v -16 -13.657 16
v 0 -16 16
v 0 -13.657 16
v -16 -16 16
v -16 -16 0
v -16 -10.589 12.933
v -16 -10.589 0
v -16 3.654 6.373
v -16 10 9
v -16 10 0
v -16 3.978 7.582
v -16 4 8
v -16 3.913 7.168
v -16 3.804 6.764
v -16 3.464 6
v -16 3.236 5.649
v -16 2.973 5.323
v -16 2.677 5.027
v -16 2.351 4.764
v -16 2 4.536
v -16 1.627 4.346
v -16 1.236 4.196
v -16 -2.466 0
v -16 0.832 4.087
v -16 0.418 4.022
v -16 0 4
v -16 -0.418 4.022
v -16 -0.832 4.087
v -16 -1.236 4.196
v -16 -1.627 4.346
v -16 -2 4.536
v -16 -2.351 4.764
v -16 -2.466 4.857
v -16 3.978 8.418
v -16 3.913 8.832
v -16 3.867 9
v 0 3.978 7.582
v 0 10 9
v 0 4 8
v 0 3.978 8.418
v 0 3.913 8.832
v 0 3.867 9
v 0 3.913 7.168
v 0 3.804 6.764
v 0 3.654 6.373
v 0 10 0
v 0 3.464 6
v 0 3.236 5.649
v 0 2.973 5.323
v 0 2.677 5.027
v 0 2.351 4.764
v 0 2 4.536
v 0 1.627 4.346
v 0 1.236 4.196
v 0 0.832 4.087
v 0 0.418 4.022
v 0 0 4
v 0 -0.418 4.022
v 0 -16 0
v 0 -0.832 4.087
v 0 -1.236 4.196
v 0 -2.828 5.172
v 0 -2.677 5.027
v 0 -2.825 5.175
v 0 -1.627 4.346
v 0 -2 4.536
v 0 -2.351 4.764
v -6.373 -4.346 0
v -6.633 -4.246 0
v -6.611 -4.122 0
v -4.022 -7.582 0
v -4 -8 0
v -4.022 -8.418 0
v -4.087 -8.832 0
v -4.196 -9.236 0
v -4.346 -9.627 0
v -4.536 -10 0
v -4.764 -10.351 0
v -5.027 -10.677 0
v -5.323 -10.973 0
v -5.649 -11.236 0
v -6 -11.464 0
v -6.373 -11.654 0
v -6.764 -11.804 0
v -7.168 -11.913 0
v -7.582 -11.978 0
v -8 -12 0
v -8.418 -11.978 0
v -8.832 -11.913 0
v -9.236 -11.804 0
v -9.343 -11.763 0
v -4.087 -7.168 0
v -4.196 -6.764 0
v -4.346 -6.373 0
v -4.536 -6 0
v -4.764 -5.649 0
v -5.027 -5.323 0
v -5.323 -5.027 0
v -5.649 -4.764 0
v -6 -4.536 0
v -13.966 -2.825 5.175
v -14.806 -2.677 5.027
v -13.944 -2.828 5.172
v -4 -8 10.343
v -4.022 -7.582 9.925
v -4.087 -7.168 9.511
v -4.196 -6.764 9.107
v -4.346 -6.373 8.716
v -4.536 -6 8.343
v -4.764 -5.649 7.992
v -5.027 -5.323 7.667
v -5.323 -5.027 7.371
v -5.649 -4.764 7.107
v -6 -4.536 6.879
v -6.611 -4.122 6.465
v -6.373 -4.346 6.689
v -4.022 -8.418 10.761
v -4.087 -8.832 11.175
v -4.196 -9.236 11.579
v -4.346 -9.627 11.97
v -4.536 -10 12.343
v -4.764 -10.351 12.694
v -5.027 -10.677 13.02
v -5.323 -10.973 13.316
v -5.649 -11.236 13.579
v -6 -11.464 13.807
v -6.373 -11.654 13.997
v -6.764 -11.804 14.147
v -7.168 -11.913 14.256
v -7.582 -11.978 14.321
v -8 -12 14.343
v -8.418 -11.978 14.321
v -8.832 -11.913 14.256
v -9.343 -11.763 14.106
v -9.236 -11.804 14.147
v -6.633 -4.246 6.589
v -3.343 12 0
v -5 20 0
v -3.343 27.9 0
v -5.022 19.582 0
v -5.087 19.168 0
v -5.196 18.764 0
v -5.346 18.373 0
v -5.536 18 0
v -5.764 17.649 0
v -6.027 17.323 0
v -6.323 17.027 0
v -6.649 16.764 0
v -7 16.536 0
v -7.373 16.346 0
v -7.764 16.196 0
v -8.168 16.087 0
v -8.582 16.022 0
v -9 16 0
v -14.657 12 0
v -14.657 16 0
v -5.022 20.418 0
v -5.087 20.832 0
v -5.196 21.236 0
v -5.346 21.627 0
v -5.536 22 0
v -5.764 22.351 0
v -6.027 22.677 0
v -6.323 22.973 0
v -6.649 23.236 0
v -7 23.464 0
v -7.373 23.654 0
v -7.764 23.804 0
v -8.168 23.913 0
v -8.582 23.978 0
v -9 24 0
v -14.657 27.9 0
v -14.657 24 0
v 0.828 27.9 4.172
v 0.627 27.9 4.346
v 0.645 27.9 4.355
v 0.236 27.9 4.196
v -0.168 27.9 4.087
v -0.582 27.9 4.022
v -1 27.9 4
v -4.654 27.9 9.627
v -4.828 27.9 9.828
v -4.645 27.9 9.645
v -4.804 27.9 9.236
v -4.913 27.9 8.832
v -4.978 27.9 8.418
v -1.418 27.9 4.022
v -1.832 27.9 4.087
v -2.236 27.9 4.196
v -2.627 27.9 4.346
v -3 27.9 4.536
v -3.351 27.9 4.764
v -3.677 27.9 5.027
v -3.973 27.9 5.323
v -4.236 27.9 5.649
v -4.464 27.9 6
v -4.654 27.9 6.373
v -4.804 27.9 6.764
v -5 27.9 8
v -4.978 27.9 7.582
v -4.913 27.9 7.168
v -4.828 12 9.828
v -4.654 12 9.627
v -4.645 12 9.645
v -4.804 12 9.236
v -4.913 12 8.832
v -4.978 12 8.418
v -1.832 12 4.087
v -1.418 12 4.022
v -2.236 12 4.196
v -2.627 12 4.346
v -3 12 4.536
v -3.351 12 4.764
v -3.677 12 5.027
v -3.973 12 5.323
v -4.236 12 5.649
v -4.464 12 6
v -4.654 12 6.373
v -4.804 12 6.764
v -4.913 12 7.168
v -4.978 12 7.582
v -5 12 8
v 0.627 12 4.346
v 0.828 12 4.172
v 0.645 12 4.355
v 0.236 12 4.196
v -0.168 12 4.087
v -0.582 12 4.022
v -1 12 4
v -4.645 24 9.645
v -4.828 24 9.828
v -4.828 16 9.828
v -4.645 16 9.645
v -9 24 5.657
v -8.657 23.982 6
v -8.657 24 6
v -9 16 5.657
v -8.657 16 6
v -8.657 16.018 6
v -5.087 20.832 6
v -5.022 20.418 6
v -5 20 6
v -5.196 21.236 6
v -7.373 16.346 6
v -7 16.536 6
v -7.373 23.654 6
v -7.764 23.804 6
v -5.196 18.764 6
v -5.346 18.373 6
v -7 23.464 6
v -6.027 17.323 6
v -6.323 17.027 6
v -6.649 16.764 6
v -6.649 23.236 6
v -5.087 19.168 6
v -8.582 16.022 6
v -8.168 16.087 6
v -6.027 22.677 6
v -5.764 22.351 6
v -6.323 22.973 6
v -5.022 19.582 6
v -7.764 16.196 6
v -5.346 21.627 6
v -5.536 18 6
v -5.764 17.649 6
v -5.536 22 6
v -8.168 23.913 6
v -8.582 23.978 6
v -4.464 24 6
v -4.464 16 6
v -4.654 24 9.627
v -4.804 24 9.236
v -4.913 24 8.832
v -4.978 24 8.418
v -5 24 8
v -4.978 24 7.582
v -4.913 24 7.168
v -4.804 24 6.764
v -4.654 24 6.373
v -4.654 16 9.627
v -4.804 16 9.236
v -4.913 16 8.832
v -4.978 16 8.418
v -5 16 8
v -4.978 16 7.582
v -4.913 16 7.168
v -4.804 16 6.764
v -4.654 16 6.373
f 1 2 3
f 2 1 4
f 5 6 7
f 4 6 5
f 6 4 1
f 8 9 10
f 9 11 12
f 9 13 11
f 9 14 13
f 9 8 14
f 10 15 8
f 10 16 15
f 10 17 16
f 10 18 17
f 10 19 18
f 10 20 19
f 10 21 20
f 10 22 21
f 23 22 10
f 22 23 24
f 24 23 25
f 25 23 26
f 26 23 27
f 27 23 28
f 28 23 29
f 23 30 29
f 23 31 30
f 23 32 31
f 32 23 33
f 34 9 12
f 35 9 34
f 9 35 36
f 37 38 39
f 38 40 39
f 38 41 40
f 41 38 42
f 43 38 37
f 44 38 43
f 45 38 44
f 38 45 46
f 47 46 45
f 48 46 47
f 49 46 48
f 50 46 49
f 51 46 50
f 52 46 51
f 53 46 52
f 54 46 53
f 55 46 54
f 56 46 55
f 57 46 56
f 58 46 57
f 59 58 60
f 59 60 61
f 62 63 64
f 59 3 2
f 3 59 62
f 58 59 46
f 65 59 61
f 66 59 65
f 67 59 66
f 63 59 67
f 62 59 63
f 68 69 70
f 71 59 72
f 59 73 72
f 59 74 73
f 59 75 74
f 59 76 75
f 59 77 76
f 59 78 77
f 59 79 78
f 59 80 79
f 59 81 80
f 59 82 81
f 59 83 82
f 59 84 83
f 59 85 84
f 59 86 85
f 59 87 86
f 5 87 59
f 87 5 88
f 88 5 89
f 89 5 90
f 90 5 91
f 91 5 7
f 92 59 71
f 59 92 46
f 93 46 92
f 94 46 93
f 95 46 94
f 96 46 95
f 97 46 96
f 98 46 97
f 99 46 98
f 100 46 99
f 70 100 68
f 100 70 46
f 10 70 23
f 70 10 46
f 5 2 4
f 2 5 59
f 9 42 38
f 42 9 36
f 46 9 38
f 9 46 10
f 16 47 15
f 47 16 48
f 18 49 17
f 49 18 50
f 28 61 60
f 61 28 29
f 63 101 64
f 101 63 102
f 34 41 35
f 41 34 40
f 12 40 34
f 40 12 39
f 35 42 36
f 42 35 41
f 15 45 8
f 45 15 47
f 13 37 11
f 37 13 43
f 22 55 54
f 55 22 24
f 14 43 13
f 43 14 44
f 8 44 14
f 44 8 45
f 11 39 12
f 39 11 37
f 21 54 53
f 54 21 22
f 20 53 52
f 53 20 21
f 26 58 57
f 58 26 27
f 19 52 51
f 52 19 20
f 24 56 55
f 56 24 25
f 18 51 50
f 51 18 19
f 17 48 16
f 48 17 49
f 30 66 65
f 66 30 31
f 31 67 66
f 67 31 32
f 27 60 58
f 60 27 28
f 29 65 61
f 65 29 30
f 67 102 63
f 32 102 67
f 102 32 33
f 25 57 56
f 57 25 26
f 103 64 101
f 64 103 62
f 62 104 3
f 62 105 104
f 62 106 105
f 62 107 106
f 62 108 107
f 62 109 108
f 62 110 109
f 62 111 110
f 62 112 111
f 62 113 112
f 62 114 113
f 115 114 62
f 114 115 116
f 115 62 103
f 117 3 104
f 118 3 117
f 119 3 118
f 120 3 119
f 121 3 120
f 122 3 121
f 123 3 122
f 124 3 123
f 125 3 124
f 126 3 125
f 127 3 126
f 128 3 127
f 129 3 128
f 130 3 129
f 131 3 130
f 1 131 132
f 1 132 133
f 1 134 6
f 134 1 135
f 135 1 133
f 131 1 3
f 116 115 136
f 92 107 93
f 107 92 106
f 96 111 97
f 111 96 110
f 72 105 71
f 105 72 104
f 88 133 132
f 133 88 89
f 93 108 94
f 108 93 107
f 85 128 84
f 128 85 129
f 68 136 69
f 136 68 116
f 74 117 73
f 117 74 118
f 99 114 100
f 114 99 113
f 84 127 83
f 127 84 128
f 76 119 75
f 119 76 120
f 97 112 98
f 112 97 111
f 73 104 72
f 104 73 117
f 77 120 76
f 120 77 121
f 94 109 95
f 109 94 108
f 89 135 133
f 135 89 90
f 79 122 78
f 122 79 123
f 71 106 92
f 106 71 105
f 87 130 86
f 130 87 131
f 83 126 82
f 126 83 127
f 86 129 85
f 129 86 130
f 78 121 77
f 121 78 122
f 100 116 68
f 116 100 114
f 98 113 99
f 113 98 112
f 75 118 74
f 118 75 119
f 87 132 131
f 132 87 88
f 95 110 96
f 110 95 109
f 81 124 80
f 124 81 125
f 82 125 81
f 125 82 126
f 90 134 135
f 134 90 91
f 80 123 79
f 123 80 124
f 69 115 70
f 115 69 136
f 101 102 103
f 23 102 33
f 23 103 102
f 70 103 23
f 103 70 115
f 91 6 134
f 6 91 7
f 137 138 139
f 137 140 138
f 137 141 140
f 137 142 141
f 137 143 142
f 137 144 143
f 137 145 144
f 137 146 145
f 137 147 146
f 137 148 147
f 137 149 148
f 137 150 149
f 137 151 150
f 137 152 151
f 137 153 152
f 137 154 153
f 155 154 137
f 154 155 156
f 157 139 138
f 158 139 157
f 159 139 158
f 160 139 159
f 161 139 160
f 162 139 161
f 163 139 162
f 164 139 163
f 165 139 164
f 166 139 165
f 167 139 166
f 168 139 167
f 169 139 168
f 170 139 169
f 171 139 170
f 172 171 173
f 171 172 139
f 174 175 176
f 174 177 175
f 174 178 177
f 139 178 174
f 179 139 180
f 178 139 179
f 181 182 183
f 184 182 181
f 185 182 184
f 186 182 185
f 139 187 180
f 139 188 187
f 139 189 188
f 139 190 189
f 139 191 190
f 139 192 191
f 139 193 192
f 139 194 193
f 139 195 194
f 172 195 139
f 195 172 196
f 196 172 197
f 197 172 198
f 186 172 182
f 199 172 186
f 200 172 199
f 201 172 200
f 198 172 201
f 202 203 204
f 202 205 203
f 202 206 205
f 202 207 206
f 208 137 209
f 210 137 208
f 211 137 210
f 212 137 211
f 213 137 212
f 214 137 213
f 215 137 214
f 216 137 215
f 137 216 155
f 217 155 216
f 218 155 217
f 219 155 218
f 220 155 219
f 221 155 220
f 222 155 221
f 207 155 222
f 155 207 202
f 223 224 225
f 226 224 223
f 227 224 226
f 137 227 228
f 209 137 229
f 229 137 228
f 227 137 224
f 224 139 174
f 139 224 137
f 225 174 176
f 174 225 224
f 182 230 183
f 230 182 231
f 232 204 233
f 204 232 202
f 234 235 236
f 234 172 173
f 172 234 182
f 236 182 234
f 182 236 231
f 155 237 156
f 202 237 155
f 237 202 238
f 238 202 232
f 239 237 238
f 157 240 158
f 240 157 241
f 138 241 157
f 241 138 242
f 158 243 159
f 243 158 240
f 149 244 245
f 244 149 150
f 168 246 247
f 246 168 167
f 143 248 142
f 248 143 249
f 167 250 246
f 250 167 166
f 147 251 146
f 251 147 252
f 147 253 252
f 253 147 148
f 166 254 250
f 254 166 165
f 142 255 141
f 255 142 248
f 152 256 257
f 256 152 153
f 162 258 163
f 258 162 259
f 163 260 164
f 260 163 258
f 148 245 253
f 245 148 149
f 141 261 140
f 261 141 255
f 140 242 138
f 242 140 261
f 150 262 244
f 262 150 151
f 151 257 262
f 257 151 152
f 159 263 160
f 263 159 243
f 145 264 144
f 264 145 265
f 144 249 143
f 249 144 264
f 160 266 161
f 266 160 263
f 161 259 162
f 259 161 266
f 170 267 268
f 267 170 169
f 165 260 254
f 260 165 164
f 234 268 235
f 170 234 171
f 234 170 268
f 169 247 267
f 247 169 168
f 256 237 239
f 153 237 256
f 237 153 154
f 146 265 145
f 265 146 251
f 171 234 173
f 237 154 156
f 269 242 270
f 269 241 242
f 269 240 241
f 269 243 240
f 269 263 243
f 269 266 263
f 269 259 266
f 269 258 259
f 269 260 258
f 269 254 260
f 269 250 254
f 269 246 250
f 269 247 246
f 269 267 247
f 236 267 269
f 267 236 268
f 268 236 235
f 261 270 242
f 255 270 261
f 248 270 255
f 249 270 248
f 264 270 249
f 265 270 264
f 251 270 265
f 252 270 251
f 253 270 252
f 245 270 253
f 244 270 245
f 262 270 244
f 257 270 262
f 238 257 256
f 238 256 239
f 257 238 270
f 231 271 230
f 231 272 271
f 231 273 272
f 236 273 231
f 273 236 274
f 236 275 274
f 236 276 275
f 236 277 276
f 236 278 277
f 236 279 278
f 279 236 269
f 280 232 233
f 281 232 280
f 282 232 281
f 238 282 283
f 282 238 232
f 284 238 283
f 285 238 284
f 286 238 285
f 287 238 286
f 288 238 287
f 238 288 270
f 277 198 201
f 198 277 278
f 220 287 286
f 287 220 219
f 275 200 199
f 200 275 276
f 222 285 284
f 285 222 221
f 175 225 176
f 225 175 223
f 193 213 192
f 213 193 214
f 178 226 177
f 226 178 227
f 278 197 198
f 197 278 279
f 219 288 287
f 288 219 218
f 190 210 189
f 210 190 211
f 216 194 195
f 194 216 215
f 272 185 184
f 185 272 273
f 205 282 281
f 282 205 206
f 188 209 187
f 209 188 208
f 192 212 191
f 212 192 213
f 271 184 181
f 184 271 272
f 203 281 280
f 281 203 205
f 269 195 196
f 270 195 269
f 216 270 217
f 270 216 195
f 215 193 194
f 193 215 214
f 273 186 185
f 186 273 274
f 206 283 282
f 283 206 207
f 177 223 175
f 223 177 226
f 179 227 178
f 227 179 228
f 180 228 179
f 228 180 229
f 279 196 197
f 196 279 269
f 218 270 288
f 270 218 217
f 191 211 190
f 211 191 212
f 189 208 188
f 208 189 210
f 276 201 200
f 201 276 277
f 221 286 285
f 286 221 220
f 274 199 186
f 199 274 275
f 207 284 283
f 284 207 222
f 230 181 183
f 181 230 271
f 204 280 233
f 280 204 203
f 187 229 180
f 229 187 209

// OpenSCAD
/*
 * clamp
 *
 * Stronger clamp which tightens against both rods to improve frame rigidity.
 *
 * Copyright 2012 <b@Zi.iS>
 * License CC BY 3.0
 *
 * Inspired by Michel Pollet <buserror@gmail.com>
 */
$fn = 60;

m8 = 8 / 2;
m8_washer = 15/2;


for(x=[0:0]) {
	for(y=[0:0]) {
		translate([
			x*20,
			y*50,
			0
		]) {
			clamp();
			translate([
				-17,
				12,
				0
			]) {
				clamp2();
			}
		}
	}
}

module clamp(
	rod = m8,
	thickness = 4
) {
	height=rod*3+thickness;
	width=rod*2+thickness*2;

	translate([0,0,height/2]) rotate([0,-90,0]) difference() {
		union() {

			translate([
				-thickness-rod,
				-height,
				0
			]) {
				cube([
					thickness*2+rod*2,
					rod*2+thickness,
					width,
				]);
				cube([
					rod+thickness*1.25,
					rod*4+thickness*2.5,
					width,
				]);

			}		
		}

		//Rod1
		translate([
			0,
			0,
			-1
		]) {
			cylinder(
				r=rod,
				h=width+2
			);
		}
		rotate([
			0,
			0,
			-45
		]) {
			translate([
				0,
				-rod,
				-1
			]) {
				cube([
					width+2,					
					rod*2,
					height+2,
				]);
			}
		}

		//Rod2	
		translate([
			-rod-thickness-1,
			-rod*2,
			thickness+rod
		]) {
			rotate([
				0,
				90,
				0
			]) {
				cylinder(
					r=rod,
					h=rod*2+thickness*2+2
				);
			}
		}
		translate([
			-rod-thickness-1,
			-rod*3,
			thickness+rod
		]) {
			rotate([
				-10,
				0,
				0
			]) {
				cube([
					width+2,					
					rod*2,
					height,
				]);
			}
		}

	}
}

module clamp2(
	rod = m8,
	thickness = 4
) {
	height=rod*4+thickness-.01;
	width=rod*2+thickness*2-0.1;

	difference() {

		intersection() {
			cube([
				height,
				width,
				width
			]);

			translate([
				rod*3+thickness-1,
				0,
				thickness+rod-1
			]) {
				rotate([
					0,
					135,
					0
				]) {
					translate([
						0,
						0,
						-rod
					]) {
						cube([
							width+2,					
							width,
							rod*2,
						]);
					}
				}
			}
		}

		//Rod1
		translate([
			rod+thickness,
			rod+thickness,
			-1
		]) {
			cylinder(
				r=rod,
				h=width+2
			);
		}

		translate([
			thickness-rod,
			thickness,
			-1
		]) {
			cube([
				rod*2,
				rod*2,
				width
			]);
		}

		//Printing
		translate([
			thickness+rod,
			thickness,
			thickness+rod-2
		]) {
			cube([
				rod*2,
				rod*2,
				width
			]);
		}

		//Rod2	
		translate([
			rod*3+thickness,
			width+1,
			thickness+rod
		]) {
			rotate([
				90,
				0,
				0
			]) {
				cylinder(
					r=rod,
					h=rod*2+thickness*2+2
				);
			}
		}
	}
}
